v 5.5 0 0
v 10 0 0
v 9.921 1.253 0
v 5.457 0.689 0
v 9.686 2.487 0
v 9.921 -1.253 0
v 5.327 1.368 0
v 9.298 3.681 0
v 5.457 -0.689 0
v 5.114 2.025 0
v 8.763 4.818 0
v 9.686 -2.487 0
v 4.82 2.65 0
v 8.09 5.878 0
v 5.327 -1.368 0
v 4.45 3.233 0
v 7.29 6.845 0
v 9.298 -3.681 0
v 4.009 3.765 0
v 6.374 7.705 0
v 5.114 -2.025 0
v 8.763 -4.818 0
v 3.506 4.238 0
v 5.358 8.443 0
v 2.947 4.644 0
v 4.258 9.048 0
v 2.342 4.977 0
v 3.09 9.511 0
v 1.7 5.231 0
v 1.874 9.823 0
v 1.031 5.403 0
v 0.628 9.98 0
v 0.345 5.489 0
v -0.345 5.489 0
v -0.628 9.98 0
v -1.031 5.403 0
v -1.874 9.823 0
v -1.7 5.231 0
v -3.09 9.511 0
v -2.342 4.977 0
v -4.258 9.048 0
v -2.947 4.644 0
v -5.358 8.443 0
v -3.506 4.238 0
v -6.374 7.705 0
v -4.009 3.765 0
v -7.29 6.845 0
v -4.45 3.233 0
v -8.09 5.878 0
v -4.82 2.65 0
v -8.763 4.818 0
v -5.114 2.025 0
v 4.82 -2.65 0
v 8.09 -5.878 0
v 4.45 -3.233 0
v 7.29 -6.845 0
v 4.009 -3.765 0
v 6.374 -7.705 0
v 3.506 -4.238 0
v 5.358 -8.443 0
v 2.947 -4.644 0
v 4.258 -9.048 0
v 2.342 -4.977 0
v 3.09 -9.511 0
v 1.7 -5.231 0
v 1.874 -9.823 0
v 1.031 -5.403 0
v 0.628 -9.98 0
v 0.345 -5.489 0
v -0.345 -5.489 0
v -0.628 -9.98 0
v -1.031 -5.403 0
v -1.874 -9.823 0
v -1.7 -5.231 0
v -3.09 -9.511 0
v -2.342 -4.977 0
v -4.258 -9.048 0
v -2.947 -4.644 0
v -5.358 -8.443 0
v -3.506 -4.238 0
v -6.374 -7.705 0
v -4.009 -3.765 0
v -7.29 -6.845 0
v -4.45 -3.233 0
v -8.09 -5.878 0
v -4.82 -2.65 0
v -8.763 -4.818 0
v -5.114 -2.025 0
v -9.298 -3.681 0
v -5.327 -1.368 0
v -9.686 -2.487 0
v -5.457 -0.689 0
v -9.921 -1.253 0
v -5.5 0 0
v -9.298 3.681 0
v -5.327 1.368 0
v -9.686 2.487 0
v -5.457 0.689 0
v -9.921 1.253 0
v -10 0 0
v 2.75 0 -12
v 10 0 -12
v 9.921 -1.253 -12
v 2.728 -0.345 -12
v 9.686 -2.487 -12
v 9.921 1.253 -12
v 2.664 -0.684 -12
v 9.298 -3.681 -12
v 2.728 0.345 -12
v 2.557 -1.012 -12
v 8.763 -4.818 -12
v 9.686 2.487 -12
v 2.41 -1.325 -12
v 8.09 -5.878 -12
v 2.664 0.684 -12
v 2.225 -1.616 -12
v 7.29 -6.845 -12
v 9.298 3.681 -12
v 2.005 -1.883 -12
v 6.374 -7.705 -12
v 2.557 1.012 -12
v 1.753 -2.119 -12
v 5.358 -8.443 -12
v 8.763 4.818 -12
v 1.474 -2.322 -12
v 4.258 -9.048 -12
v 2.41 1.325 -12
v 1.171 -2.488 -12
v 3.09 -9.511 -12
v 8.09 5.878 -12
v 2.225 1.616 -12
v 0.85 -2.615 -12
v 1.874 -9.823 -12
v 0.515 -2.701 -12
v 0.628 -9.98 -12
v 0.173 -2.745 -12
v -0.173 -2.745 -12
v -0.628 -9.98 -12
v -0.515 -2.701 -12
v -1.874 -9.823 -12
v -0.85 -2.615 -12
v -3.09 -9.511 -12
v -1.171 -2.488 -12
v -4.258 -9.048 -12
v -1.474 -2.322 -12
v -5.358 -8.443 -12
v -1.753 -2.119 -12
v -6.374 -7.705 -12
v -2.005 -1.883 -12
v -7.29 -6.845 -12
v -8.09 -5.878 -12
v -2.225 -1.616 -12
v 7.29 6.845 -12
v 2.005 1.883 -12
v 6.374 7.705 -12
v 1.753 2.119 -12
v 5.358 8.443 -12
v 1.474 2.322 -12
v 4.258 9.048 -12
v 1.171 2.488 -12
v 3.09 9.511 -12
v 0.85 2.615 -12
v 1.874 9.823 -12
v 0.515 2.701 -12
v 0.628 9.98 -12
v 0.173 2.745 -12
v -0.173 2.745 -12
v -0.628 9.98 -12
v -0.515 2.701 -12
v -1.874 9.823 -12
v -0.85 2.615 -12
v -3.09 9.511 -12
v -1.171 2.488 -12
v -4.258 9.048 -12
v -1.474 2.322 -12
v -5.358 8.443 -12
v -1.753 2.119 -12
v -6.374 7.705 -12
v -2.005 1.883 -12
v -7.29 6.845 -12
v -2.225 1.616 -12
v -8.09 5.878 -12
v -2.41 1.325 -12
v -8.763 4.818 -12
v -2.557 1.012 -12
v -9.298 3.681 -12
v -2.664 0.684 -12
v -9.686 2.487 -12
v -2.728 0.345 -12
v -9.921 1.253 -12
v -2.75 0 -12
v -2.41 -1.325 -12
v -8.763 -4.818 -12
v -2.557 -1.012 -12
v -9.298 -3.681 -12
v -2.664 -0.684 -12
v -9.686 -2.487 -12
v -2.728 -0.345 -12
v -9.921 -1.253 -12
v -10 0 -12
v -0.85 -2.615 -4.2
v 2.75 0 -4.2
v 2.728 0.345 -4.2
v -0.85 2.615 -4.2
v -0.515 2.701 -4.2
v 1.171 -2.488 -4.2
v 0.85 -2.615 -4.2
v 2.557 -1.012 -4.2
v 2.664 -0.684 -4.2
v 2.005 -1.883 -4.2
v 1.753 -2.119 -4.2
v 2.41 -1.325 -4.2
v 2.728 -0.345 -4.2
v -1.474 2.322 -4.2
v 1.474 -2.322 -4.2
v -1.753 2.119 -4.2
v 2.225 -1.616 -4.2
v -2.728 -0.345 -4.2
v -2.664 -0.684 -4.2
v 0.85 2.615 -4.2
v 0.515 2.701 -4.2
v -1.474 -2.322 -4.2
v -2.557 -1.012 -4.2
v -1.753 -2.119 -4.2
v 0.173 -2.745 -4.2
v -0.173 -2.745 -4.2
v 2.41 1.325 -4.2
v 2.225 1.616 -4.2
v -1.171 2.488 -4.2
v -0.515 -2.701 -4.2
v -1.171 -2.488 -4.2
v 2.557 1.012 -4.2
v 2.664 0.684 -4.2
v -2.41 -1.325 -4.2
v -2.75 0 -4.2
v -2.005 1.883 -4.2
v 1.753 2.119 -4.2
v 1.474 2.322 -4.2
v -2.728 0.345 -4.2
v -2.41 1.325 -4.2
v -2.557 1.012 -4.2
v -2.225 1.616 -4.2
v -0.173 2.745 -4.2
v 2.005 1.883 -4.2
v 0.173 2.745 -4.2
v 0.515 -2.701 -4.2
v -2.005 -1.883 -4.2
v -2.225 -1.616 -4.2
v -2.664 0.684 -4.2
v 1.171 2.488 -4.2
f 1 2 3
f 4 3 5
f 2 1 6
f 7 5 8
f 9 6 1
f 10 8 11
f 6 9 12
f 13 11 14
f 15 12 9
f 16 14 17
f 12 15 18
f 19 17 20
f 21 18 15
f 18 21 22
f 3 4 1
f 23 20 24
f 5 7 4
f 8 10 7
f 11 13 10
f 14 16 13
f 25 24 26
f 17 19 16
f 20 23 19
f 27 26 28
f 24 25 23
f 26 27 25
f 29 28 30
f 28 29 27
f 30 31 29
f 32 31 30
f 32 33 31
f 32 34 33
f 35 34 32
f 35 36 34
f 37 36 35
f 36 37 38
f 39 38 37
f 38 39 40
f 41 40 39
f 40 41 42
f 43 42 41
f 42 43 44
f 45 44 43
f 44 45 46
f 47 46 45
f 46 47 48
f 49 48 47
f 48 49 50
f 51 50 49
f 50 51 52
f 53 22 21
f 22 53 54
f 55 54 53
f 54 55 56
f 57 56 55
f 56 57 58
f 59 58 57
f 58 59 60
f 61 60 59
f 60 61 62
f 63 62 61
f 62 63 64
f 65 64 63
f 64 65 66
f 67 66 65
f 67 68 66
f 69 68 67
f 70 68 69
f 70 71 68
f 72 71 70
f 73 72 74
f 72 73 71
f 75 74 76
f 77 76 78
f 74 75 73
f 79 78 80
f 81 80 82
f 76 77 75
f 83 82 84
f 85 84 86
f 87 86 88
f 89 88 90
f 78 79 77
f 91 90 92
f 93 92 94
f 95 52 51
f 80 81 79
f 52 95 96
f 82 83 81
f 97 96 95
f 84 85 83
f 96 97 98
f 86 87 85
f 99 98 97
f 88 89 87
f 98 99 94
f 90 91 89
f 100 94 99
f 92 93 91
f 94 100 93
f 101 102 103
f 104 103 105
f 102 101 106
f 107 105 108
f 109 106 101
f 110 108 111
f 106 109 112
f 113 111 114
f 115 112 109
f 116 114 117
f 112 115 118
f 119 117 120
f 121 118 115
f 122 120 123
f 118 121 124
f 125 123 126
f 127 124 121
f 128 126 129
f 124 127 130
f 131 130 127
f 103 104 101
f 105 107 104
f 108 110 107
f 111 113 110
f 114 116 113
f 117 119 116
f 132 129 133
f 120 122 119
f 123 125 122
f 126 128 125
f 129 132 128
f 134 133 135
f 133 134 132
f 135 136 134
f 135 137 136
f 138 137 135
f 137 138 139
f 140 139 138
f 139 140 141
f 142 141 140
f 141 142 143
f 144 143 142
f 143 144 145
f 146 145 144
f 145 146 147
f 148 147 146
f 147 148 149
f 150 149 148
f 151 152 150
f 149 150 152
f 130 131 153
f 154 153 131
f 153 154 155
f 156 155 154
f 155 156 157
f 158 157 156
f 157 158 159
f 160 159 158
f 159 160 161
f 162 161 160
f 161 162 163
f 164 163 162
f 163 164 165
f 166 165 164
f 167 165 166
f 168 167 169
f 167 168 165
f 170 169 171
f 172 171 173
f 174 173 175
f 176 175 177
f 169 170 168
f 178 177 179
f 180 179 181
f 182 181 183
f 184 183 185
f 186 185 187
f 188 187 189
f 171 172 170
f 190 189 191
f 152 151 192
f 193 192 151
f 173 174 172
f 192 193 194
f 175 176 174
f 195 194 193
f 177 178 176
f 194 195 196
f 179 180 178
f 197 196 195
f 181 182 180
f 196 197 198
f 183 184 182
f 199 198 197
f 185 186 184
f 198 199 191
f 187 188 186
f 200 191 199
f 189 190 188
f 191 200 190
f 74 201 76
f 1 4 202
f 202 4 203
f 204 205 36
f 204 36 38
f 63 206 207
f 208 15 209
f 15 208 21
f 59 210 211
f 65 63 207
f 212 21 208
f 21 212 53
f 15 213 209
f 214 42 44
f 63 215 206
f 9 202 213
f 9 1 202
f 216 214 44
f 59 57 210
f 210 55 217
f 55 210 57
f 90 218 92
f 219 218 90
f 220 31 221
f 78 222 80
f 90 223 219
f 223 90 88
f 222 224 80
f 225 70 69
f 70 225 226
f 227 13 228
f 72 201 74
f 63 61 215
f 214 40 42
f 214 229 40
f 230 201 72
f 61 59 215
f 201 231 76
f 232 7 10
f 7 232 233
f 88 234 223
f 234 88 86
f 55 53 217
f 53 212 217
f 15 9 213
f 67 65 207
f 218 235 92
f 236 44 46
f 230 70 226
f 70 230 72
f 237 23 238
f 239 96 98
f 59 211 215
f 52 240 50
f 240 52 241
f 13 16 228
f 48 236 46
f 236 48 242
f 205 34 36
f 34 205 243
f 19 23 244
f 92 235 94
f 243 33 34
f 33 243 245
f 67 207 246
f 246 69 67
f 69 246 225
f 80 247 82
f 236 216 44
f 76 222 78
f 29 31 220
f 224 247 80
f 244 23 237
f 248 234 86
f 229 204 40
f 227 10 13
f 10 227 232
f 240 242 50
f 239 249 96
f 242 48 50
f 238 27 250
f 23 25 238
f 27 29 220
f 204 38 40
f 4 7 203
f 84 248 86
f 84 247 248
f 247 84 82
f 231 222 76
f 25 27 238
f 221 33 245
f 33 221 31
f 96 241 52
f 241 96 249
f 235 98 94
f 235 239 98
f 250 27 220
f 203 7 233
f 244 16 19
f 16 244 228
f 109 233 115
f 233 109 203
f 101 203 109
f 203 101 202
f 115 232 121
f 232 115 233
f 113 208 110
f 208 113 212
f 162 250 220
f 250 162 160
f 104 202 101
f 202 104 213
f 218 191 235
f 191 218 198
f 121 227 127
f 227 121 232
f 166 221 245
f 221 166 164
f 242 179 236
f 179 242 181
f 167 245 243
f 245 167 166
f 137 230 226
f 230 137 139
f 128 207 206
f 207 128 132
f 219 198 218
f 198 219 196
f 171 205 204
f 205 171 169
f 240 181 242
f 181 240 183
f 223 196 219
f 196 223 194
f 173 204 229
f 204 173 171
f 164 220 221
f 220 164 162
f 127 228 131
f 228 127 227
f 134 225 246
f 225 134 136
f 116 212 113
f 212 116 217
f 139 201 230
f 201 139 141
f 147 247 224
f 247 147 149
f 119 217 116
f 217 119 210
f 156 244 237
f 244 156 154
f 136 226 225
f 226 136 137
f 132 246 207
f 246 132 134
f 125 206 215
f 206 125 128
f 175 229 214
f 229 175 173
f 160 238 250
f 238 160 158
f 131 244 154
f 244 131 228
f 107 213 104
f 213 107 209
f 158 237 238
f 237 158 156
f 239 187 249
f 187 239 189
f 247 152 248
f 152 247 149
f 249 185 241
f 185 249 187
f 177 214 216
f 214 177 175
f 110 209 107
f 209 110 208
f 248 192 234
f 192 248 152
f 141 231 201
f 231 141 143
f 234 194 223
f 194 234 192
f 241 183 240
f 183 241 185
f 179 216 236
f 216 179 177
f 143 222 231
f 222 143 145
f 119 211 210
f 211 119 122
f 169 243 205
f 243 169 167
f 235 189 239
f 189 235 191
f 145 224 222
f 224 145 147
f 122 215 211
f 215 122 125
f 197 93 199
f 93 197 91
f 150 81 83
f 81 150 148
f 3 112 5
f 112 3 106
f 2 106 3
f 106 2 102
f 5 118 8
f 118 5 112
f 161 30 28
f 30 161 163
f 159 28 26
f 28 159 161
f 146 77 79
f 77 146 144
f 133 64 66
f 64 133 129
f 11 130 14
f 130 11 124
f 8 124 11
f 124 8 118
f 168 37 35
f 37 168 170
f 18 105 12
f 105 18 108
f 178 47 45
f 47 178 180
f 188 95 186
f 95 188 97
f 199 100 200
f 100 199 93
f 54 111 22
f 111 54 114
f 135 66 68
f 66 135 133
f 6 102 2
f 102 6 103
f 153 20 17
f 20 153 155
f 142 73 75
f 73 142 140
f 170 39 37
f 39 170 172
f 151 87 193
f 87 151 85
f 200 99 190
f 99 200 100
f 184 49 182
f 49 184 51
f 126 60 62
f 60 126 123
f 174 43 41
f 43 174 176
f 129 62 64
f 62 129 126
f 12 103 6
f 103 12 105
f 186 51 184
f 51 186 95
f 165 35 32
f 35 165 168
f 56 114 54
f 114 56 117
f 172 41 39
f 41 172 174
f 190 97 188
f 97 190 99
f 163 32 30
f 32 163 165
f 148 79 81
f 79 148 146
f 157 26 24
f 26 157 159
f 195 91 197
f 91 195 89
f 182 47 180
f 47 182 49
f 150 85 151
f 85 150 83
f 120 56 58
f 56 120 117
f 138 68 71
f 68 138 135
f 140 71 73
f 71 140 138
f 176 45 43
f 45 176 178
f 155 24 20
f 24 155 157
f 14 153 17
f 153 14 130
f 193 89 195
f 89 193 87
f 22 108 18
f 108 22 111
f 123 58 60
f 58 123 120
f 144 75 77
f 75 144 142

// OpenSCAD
$fn = 50;


difference() {
	union() {
		translate(v = [0, 0, -12.0000000000]) {
			cylinder(h = 12, r = 10.0000000000);
		}
		cylinder(h = 0, r = 19.0000000000);
	}
	union() {
		translate(v = [0, 0, 0]) {
			rotate(a = [0, 0, 0]) {
				difference() {
					union() {
						#translate(v = [0, 0, -12.0000000000]) {
							cylinder(h = 12, r = 2.2500000000);
						}
						#translate(v = [0, 0, -4.2000000000]) {
							cylinder(h = 4.2000000000, r = 10.0000000000, r1 = 2.7500000000, r2 = 5.5000000000);
						}
						#translate(v = [0, 0, -12.0000000000]) {
							cylinder(h = 12, r = 2.7500000000);
						}
						#translate(v = [0, 0, -12.0000000000]) {
							cylinder(h = 12, r = 2.2500000000);
						}
					}
					union();
				}
			}
		}
	}
}
